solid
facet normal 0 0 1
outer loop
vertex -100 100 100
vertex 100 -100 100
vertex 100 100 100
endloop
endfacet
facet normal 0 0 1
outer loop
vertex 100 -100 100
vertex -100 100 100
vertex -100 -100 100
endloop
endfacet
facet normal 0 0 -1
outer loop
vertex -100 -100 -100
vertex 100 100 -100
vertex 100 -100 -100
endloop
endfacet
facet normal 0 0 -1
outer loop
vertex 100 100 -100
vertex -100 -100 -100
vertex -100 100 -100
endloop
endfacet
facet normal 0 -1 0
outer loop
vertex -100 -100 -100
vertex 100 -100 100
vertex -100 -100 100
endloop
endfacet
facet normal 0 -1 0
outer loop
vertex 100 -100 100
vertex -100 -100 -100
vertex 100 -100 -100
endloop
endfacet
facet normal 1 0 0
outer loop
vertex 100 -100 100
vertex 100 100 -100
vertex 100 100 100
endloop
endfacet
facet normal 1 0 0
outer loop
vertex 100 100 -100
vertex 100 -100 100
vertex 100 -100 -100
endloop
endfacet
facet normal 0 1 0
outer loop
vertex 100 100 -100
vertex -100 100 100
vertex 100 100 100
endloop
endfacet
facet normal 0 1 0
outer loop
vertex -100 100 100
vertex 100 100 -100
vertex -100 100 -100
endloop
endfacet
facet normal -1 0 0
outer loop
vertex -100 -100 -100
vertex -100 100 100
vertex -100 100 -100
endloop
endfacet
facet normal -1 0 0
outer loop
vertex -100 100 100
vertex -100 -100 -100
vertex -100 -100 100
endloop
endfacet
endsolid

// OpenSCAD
opU=1;// 1 union
opI=2;// 1 intersection
opS=3;// 1 subtraction
opT=4;// M transformation 4X4 functional
opH=5;// 1 Convex hull
opE=6;// 3 Extrude 2d shape, simple Z extrude of a subtree of Z plane cut (Q collapsed to z=0)
opO=7;// 1 offset usually by distance but xyz surface normal or ambinet occlusion is possiblites
opD=8;// ""not impleneted"" deformation modifyers [twist, bend, pinch, displace, taper]

cR3=10;// unit radius cube
//named numbers
opc=0; params=1;subra=2;x=0;y=1;z=2;null3=[0,0,0];

indent=["-","--","---","----","-----","------","-------","--------"];

field=[opU,1,[for(i=[0:4])[opT,un(rndc(-1,1))*50,[[cR3,25]]]]];
span=100;bon=[ [-span,-span,-span],[span,span,span]];
 
module uglymarch(field,bon)
{
for(iz=[bon[0][2]:bon[1][2]],iy=[bon[0][1]:bon[1][1]],ix=[bon[0][0]:bon[1][0]])
{
echo(eval([ix,iy,iz],field));
if (eval([ix,iy,iz],field)<0)translate([ix,iy,iz])sphere(1);
}
}

 #translate(bon[0])cube(bon[1]-bon[0]);

function eval(q,v)=
let( opcode=v[opc],p=v[params])
//if code  then
opcode== cR3 ? cR3(q,p):
opcode== opT ? opT(q,p,v[subra]):
opcode== opD ? opT(q,null3,v[subra])://deform behaves like null trnasform for now
opcode== opU ? opU(q,p,v[subra]):
opcode== opH ? opU(q,p,v[subra])://hull behaves like union for now:
opcode== opI ? opI(q,p,v[subra]):
opcode== opS ? opS(q,p,v[subra]):
opcode== opO ? opO(q,p,v[subra]):
opcode== opE ? opE(q,p,v[subra]):
1
;

function opE(q,p,v)=min([for(i=[0:len(v)-1]) eval(Clampz(q,p),v[i])]);
function opU(q,p,v)=min([for(i=[0:len(v)-1]) eval(q,v[i])]);
function opI(q,p,v)=max([for(i=[0:len(v)-1]) eval(q,v[i])]);
function opS(q,p,v)=max( -eval(q,v[0]),min([for(i=[1:len(v)-1]) eval(q,v[i])]));
function opO(q,M,v)=min([for(i=[0:len(v)-1]) Offs(eval(q,v[i]),M)]);
function opT(q,M,v)=min([for(i=[0:len(v)-1]) eval(Transf(q,M),v[i])]);

function Transf(q,M)=q-M;
function Offs(v,M)=v-M;
function Clampz(q,p)=[q[x],q[y],q[z]<p[0]&&q[z]>0?0:q[z]>p[0]?q[z]-p[0]:q[z]];
function cR3(q,r)=len3(q)-r; 

 function rnd(a = 1, b = 0) = (rands(min(a, b), max(a, b), 1)[0]);
 function rndc(a = 1, b = 0)=[rnd(a,b),rnd(a,b),rnd(a,b)];
 function un(v) = v / max(len3(v), 0.000001) * 1;
 function addl(l,c=0)=c<len(l)-1?l[c]+addl(l,c+1):l[c];
//function avrg(l)=len(l)>1?addl(l)/(len(l) ):l;
 function len3(v) =len(v)>1?sqrt(addl([for(i=[0:len(v)-1])pow(v[i], 2)])):len(v)==1?v[0]:v;
 function bound(v)=[[minls(v,0),minls(v,1),minls(v,2)], [maxls(v,0),maxls(v,1),maxls(v,2)]];
////function maxl(l,c=0)=c<len(l)-1?max(l[c],maxl(l,c+1)):l[c];
////function minl(l,c=0)=c<len(l)-1?min(l[c],minl(l,c+1)):l[c];
 function maxls(l,select=0,c=0)=c<len(l)-1?max(l[c][select],maxls(l,select,c+1)):l[c][select];
 function minls(l,select=0,c=0)=c<len(l)-1?min(l[c][select],minls(l,select,c+1)):l[c][select];
